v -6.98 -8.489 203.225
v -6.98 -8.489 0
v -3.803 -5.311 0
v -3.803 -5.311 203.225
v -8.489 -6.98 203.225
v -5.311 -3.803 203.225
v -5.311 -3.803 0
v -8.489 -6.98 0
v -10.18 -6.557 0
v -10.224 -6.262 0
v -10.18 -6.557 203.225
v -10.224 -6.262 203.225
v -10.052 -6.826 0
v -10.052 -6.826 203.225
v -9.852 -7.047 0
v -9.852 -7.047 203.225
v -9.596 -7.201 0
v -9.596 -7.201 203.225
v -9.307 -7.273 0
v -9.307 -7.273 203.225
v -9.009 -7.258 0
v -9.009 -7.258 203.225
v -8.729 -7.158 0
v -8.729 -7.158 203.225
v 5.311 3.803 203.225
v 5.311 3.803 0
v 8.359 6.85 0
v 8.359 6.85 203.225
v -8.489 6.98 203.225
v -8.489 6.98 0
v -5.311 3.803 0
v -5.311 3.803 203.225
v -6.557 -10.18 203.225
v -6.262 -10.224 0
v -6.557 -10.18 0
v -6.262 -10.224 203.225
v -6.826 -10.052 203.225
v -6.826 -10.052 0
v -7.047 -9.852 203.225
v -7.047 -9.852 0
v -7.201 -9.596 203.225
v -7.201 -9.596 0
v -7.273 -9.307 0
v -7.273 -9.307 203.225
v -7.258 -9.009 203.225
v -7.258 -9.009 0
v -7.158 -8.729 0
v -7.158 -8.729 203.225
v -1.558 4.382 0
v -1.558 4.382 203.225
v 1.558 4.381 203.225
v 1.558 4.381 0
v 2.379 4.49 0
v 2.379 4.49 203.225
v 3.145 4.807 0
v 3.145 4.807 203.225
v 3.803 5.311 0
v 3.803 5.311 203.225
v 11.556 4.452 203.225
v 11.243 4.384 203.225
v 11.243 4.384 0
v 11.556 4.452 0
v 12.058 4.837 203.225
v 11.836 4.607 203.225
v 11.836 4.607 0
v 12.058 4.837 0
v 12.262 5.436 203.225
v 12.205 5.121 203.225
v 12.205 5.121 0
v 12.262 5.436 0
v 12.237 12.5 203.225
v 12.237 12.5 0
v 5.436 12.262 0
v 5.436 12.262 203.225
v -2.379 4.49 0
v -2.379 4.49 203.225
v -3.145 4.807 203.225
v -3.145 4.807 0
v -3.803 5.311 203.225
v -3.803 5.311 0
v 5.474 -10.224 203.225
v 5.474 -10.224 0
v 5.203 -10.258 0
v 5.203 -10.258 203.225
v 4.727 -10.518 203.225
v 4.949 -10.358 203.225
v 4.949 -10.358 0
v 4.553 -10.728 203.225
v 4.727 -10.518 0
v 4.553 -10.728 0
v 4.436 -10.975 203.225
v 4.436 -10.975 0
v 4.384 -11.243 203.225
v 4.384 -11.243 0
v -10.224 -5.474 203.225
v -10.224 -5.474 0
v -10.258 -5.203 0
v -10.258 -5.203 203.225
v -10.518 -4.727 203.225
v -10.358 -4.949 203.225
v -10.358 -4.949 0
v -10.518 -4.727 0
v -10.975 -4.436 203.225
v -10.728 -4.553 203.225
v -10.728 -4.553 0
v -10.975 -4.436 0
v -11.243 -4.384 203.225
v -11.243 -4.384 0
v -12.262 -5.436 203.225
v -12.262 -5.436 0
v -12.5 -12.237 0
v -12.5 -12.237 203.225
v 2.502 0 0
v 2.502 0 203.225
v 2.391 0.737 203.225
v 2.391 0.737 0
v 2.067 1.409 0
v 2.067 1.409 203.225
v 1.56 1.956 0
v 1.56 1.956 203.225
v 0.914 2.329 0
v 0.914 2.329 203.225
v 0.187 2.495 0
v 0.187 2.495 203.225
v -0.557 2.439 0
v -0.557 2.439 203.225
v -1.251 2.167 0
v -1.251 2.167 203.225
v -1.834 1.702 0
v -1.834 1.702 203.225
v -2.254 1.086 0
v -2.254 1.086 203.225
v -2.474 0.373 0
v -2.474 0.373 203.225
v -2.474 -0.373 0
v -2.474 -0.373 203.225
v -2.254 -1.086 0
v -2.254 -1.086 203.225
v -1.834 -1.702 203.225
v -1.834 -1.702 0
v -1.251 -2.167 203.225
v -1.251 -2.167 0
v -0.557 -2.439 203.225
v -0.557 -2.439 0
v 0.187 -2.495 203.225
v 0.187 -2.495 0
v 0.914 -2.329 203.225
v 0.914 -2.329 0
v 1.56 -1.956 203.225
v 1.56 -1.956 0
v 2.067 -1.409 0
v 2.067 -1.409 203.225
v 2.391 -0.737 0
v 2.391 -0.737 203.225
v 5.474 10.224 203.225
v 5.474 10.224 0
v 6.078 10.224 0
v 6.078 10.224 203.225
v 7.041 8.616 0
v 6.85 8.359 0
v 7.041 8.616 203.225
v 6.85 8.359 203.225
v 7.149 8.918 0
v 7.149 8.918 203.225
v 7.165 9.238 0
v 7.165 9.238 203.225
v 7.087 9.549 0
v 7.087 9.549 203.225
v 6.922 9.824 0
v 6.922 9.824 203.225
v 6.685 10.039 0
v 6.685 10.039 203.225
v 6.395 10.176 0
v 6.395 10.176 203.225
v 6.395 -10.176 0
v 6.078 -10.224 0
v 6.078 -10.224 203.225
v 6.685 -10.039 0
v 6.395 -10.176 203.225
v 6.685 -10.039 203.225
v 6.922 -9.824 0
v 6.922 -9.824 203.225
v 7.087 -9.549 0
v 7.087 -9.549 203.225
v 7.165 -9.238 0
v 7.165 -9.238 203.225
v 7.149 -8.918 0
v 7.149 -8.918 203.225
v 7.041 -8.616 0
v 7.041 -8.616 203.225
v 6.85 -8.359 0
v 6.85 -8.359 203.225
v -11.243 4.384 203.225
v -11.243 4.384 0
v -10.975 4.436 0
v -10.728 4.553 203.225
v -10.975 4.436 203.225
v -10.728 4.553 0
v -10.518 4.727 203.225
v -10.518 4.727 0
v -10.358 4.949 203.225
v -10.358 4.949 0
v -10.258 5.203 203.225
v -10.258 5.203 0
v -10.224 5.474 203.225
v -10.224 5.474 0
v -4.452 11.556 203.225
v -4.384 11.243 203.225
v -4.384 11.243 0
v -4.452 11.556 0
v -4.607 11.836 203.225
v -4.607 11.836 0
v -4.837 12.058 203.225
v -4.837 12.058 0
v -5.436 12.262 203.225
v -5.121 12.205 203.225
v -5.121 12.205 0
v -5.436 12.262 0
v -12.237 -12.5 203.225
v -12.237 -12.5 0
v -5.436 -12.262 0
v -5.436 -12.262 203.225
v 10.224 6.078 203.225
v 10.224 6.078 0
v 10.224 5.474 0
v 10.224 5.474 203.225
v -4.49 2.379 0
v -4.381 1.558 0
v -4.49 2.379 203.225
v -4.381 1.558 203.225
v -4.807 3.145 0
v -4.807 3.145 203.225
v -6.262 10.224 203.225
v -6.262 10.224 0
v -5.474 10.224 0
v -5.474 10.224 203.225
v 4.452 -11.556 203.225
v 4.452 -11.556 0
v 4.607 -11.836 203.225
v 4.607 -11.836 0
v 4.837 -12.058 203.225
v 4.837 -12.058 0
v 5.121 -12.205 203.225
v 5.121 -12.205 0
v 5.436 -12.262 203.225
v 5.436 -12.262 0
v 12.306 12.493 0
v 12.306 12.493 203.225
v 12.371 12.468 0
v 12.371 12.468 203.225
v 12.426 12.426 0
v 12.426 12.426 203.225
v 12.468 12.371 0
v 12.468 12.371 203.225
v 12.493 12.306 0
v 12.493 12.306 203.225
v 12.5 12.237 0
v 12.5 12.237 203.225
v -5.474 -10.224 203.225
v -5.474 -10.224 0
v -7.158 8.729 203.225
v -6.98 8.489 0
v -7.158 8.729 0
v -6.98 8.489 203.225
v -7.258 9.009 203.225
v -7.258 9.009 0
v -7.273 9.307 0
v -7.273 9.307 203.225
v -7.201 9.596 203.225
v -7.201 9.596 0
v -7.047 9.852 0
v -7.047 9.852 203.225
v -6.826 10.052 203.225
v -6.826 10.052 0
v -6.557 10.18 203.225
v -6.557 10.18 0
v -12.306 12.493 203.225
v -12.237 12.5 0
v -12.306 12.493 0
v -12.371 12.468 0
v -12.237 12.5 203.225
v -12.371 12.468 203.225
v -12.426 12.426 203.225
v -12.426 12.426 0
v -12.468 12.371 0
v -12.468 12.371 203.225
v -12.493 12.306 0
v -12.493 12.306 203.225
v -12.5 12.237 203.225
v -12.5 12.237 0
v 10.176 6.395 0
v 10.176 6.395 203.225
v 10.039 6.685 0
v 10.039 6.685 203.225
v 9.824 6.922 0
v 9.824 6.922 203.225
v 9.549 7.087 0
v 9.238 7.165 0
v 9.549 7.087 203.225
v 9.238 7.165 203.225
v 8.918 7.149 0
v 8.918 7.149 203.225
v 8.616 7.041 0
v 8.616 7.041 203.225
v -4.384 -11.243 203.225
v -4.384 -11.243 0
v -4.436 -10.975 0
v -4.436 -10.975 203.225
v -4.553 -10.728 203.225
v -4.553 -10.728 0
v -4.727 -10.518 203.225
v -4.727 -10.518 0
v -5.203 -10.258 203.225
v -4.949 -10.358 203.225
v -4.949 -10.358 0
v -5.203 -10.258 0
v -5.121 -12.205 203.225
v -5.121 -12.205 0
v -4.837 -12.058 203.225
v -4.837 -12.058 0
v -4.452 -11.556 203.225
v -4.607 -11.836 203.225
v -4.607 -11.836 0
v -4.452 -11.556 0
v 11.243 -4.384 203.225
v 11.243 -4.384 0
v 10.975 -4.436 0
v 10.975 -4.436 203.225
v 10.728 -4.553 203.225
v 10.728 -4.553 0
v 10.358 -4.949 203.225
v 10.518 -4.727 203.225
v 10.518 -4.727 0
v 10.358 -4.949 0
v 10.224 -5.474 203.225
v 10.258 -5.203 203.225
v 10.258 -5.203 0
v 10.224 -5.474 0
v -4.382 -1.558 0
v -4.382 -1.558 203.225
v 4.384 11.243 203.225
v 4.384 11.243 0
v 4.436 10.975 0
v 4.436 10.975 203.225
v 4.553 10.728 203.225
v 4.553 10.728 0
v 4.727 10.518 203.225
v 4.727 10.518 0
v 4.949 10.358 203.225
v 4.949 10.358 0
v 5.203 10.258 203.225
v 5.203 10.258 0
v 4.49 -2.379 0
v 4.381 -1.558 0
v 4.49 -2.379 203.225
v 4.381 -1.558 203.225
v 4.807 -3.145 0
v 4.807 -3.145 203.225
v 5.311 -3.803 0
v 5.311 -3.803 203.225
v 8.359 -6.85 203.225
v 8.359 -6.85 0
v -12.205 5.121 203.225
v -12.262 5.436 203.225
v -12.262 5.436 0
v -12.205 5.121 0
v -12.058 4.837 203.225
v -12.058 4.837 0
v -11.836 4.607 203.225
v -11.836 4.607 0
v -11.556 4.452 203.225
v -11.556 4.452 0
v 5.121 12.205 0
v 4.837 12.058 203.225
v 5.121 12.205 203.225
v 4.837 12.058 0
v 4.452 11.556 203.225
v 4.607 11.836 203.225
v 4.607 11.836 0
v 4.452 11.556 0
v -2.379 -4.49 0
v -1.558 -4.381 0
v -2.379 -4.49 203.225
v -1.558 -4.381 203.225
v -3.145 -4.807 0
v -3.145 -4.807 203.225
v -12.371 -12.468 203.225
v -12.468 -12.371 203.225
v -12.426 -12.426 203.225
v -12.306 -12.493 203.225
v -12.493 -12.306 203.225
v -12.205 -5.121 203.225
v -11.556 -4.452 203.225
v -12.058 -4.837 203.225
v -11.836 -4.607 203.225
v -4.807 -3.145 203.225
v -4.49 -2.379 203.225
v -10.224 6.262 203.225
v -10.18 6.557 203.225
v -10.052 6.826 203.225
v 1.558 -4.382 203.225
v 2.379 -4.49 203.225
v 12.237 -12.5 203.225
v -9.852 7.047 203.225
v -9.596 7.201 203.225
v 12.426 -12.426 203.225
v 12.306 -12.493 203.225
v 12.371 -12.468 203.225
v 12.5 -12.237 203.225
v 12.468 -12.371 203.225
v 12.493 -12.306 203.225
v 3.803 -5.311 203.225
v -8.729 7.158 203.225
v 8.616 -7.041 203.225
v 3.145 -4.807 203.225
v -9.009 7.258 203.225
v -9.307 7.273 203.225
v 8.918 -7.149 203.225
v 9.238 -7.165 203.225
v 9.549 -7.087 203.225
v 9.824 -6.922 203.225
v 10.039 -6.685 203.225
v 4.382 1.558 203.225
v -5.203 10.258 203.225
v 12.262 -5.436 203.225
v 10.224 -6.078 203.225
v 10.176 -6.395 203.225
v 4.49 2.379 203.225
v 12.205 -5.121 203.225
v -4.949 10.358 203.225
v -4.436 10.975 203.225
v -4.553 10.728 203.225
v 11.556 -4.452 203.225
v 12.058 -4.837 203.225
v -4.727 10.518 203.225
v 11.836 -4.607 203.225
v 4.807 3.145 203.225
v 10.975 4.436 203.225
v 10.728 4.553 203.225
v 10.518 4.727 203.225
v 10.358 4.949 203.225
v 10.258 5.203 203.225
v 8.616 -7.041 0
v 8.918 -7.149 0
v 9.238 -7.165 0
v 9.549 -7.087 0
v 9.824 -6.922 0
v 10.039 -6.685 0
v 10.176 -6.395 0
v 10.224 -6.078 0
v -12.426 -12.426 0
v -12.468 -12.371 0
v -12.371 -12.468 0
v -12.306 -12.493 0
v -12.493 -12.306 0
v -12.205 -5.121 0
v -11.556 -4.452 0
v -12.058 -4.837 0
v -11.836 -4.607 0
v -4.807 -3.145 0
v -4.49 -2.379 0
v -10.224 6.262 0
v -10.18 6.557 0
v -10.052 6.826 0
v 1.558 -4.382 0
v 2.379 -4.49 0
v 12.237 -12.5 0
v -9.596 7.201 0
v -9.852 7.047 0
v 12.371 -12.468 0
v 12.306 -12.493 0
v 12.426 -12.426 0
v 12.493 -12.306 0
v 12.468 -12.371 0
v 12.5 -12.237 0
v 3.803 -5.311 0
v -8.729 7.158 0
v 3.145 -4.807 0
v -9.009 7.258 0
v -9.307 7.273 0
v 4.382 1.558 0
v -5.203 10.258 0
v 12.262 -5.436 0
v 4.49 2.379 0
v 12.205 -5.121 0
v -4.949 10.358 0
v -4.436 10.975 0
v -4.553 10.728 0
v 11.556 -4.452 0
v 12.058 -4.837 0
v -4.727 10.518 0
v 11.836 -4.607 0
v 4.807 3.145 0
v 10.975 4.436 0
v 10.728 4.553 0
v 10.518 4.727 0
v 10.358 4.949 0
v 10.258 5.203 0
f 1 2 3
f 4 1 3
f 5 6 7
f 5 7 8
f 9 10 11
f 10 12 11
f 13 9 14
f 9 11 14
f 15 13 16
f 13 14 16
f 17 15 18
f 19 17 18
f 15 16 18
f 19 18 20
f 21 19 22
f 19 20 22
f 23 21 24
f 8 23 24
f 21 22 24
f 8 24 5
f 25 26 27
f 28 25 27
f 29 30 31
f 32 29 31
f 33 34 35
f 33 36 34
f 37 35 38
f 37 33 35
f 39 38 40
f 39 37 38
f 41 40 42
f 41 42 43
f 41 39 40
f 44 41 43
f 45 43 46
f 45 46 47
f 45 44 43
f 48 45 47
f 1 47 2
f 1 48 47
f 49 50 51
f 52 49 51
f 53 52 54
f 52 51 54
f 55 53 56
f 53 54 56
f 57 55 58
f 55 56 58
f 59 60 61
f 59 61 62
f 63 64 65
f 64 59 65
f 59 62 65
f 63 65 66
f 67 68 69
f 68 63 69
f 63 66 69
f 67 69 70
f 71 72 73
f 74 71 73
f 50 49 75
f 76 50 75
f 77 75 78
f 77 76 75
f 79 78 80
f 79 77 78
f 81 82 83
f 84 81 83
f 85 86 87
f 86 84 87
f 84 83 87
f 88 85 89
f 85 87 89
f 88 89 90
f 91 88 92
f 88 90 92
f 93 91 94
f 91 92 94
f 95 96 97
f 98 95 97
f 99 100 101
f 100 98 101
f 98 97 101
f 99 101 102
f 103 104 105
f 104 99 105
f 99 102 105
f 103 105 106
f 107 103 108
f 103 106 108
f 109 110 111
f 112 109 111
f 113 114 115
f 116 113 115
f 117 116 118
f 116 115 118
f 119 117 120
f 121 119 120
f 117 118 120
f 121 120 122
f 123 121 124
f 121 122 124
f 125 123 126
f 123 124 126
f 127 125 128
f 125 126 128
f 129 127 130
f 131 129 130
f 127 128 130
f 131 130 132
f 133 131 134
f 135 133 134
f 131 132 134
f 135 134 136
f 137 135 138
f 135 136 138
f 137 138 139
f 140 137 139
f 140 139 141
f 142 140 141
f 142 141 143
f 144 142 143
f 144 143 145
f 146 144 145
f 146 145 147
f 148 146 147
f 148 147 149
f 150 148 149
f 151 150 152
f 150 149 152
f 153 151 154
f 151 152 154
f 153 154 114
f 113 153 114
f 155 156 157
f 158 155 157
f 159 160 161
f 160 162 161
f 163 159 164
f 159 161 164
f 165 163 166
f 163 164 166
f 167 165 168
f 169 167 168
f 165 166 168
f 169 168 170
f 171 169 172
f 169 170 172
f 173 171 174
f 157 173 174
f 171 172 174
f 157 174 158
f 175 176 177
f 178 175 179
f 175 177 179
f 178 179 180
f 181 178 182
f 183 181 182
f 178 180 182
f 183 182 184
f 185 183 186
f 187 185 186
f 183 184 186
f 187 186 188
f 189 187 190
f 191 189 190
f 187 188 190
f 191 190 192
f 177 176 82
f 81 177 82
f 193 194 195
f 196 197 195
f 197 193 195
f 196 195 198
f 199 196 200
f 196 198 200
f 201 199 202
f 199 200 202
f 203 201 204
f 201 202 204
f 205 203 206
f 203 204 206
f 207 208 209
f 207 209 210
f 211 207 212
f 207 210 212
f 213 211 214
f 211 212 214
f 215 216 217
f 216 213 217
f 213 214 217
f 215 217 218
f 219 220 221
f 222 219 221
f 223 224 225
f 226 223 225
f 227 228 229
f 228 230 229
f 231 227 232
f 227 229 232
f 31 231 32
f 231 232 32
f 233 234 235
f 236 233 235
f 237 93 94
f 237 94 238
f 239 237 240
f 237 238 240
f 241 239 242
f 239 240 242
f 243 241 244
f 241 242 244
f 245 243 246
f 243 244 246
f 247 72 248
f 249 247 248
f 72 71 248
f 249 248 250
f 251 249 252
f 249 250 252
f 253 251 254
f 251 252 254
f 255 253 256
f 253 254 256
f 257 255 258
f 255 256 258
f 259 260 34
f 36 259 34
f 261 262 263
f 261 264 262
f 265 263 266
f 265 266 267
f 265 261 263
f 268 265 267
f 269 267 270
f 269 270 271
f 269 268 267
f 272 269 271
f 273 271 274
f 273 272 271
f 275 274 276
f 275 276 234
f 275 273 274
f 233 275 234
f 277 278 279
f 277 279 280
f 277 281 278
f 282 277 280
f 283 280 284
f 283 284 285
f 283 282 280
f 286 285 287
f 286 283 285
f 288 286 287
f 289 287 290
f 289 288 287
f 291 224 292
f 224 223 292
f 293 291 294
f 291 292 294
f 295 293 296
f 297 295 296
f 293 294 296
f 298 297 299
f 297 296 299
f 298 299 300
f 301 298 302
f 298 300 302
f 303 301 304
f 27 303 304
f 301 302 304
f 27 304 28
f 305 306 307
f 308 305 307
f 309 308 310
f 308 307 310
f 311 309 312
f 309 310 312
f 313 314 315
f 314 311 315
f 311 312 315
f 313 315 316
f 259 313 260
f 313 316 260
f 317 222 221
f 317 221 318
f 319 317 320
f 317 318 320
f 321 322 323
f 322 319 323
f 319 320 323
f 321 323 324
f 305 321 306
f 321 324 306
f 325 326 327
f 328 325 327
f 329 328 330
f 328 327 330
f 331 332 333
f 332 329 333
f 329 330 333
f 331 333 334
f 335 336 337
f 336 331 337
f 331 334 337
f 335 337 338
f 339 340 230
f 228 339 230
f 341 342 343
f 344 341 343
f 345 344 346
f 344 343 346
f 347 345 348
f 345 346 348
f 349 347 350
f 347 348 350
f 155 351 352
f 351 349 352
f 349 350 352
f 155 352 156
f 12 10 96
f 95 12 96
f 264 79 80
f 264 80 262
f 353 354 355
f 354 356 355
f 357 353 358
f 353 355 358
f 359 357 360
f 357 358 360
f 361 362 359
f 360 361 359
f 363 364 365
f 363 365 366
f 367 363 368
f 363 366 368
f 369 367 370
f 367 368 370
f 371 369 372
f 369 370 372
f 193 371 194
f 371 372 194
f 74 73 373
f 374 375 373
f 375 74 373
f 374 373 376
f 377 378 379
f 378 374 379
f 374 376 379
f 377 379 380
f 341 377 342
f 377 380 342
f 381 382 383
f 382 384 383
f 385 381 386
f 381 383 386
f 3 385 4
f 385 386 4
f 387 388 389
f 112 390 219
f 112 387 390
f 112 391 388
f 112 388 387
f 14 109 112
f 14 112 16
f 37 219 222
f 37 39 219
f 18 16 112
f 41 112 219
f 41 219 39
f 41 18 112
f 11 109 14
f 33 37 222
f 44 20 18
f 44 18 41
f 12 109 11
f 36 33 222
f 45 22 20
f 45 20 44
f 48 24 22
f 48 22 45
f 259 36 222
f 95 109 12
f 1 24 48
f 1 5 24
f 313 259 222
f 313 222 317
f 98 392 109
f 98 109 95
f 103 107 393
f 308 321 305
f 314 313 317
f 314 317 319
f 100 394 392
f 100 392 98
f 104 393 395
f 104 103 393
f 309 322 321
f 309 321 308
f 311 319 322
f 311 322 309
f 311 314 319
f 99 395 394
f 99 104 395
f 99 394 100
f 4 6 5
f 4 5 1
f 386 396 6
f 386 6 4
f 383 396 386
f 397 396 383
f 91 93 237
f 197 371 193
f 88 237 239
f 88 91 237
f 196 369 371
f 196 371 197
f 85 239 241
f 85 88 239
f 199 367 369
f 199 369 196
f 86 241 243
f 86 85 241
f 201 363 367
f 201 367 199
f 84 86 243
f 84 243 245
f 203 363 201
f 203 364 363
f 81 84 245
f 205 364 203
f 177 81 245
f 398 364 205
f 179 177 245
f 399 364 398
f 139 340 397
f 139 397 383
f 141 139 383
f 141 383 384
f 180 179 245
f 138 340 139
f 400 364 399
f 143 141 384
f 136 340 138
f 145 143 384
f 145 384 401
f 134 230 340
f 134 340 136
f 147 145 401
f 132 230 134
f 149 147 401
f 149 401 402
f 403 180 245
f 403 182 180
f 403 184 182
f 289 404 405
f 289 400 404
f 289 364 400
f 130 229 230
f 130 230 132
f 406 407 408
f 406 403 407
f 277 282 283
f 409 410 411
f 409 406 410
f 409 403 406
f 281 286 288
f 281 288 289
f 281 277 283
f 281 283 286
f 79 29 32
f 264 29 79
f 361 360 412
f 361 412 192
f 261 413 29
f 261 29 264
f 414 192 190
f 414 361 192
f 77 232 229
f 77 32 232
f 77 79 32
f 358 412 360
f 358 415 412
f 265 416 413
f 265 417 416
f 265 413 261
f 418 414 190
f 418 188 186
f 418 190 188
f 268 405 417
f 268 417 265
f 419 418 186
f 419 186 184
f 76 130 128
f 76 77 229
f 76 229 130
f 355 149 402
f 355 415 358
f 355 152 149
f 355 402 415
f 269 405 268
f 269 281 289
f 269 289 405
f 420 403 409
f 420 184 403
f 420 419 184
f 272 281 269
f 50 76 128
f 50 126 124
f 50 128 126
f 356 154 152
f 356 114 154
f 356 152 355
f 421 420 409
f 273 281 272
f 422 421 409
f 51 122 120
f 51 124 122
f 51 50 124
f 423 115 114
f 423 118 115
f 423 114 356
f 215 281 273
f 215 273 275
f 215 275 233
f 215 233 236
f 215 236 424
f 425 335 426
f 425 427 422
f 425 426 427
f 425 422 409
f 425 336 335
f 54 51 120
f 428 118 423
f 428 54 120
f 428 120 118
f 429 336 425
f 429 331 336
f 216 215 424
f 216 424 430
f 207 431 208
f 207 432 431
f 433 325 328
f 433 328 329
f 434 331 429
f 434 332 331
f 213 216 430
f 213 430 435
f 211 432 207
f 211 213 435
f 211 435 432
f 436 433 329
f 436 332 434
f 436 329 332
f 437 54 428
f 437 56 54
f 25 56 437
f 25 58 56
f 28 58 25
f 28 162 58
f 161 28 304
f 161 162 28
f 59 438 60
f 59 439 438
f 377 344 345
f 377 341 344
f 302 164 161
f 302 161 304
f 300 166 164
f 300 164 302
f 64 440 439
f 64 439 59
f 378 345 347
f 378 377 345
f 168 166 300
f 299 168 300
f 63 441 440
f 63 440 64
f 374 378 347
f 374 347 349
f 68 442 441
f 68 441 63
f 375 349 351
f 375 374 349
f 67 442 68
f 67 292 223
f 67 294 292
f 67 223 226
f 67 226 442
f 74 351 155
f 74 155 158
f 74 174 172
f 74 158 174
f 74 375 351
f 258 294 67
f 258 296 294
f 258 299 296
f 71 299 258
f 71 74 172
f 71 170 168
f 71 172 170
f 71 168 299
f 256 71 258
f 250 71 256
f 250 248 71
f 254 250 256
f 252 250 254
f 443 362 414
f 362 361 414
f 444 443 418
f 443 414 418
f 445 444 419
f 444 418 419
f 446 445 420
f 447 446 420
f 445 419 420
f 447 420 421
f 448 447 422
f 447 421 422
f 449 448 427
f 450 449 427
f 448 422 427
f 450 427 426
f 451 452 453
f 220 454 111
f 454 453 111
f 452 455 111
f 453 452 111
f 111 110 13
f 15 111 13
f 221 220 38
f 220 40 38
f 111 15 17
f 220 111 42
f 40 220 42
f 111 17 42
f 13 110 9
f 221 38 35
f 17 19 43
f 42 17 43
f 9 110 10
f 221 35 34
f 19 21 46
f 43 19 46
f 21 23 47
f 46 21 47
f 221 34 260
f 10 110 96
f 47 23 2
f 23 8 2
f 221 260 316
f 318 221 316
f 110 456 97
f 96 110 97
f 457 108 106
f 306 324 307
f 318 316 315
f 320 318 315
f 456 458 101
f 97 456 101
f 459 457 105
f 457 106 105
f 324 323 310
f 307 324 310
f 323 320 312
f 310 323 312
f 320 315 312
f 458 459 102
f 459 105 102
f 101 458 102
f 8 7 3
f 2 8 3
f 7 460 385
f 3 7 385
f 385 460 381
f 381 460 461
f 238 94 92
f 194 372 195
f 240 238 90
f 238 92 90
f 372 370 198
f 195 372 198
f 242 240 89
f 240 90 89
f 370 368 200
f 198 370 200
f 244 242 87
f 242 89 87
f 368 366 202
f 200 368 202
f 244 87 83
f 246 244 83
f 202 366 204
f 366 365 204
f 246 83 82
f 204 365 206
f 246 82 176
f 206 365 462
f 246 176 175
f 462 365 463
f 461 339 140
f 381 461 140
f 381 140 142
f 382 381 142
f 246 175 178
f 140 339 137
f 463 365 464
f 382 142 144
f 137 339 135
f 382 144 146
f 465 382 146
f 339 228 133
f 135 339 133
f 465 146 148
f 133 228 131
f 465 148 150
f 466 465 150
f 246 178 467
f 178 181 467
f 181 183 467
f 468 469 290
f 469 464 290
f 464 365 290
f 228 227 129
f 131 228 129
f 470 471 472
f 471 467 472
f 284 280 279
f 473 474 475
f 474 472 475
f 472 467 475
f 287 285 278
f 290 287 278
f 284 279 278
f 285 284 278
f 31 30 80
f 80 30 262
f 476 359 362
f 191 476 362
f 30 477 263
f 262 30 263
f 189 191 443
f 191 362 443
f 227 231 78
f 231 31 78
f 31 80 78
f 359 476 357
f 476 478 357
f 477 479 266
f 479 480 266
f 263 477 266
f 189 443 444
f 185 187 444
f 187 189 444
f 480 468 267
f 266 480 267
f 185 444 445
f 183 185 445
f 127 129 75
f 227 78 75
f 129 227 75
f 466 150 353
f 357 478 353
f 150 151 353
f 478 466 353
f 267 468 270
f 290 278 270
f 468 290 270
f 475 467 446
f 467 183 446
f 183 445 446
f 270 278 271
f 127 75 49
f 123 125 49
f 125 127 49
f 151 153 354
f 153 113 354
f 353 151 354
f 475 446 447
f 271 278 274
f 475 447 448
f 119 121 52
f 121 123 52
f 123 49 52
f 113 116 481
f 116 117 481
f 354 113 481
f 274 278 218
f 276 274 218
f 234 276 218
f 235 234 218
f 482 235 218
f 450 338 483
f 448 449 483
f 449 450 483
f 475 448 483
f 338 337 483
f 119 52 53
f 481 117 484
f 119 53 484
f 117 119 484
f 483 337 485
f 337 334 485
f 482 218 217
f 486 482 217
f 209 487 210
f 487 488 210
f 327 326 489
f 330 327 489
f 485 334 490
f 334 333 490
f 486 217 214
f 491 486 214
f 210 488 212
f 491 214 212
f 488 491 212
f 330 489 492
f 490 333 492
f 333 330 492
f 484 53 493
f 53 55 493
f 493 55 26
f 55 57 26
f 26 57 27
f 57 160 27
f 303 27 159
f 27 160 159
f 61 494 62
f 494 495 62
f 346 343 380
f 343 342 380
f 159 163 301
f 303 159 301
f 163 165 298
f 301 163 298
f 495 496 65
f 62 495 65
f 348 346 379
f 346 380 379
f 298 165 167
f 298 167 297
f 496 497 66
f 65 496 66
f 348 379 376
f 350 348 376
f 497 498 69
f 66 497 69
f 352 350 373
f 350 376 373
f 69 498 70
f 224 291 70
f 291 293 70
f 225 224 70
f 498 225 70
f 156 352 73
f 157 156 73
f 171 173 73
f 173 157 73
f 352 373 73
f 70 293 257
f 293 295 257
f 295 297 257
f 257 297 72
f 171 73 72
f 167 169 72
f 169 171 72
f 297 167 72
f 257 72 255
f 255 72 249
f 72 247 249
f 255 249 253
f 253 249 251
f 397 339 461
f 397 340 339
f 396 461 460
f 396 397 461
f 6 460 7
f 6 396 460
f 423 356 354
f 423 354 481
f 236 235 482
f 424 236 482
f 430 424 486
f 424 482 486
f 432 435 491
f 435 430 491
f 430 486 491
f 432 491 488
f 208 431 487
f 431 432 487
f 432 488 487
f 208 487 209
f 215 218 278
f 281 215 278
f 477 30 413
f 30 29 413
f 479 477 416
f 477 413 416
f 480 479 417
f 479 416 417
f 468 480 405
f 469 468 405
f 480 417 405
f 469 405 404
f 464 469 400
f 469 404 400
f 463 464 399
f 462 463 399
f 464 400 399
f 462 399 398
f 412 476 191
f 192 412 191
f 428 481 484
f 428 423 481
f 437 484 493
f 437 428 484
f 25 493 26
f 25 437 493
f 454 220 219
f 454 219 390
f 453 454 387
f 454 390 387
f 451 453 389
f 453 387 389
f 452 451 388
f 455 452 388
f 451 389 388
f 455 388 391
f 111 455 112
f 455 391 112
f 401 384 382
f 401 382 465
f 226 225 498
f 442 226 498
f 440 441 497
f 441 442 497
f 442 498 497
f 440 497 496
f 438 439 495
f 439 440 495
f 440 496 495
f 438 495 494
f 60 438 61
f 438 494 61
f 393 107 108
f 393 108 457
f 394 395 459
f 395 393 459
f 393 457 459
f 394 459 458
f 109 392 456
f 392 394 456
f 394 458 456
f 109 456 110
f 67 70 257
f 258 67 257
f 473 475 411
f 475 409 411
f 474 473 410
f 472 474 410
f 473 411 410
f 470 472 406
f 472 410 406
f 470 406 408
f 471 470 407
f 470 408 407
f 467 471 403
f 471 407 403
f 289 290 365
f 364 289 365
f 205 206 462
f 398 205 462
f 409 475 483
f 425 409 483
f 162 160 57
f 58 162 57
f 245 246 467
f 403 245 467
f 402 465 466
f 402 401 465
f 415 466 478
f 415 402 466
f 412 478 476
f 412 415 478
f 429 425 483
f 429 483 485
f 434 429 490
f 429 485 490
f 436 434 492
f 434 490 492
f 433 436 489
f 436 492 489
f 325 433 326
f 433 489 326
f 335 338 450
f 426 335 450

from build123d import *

# Parameters (mm, degrees)
BOSS_EXTRUDE1_DEPTH   = 203.2254
BOSS_EXTRUDE1_2_DEPTH = 203.2254
BOSS_EXTRUDE1_3_DEPTH = 203.2254
BOSS_EXTRUDE1_4_DEPTH = 203.2254
FILLET1_R             = 1.0922
FILLET2_R             = 1.0922
FILLET3_R             = 1.016
FILLET4_R             = 1.016
FILLET5_R             = 0.254
FILLET6_R             = 0.254
FILLET7_R             = 0.254
FILLET8_R             = 0.254
FILLET9_R             = 1.016
FILLET10_R            = 1.0922
FILLET11_R            = 1.0922
FILLET12_R            = 1.0922
FILLET13_R            = 1.0922
FILLET14_R            = 1.0922
SKETCH2_W             = 8.763
SKETCH2_H             = 8.763
SKETCH2_R             = 2.5019
BOSS_EXTRUDE2_DEPTH   = 203.2254
FILLET15_R            = 3.175


with BuildPart() as part:
    # Sketch1 → Boss-Extrude1 (new body)
    with BuildSketch(Plane.XY):
        Polygon((-8.714816972, 10.2235), (-4.3815, 10.2235), (-4.3815, 12.225663986), (-12.5095, 12.5095), (-12.225663986, 4.3815), (-10.2235, 4.3815), (-10.2235, 8.714816972), (-4.3815, 2.872816972), (-4.3815, 4.3815), (-2.872816972, 4.3815), align=None)
    extrude(amount=BOSS_EXTRUDE1_DEPTH)

    # Fillet1
    # the kernel refuses this fillet: 1.0922 mm, written as the material it takes off along each edge
    with BuildSketch(Plane(origin=(-4.3815, 10.2235, -2.7305), x_dir=(-1, 0, 0), z_dir=(0, 0, 1))) as fillet1_piece_1:
        with BuildLine():
            CenterArc((FILLET1_R, -FILLET1_R), FILLET1_R, 90, 90)
            Line((0, -FILLET1_R), (0, 0))
            Line((0, 0), (FILLET1_R, 0))
        make_face()
    extrude(amount=208.6864, mode=Mode.SUBTRACT)
    with BuildSketch(Plane(origin=(-4.3815, 12.225663986, -2.6368132), x_dir=(0, -1, 0), z_dir=(0, 0, 1))) as fillet1_piece_2:
        with BuildLine():
            CenterArc((FILLET1_R * 0.965688774807, -FILLET1_R), FILLET1_R, 90, 88)
            Line((-FILLET1_R * 0.033702052212, -FILLET1_R * 0.965100503298), (0, 0))
            Line((0, 0), (FILLET1_R * 0.965688774807, 0))
        make_face()
    extrude(amount=208.499026399, mode=Mode.SUBTRACT)

    # Fillet2
    # the kernel refuses this fillet: 1.0922 mm, written as the material it takes off along each edge
    with BuildSketch(Plane(origin=(-10.2235, 4.3815, -2.7305), x_dir=(0, 1, 0), z_dir=(0, 0, 1))) as fillet2_piece_1:
        with BuildLine():
            CenterArc((FILLET2_R, FILLET2_R), FILLET2_R, 180, 90)
            Line((0, FILLET2_R), (0, 0))
            Line((0, 0), (FILLET2_R, 0))
        make_face()
    extrude(amount=208.6864, mode=Mode.SUBTRACT)
    with BuildSketch(Plane(origin=(-12.225663986, 4.3815, -2.6368132), x_dir=(1, 0, 0), z_dir=(0, 0, 1))) as fillet2_piece_2:
        with BuildLine():
            CenterArc((FILLET2_R * 0.965688774807, FILLET2_R), FILLET2_R, 182, 88)
            Line((-FILLET2_R * 0.033702052212, FILLET2_R * 0.965100503298), (0, 0))
            Line((0, 0), (FILLET2_R * 0.965688774807, 0))
        make_face()
    extrude(amount=208.499026399, mode=Mode.SUBTRACT)

    # Fillet3
    fillet3_edges = [part.edges().sort_by_distance(p)[0] for p in [
        (-10.2235, 8.714816972, 101.6127),
    ]]
    fillet(fillet3_edges, radius=FILLET3_R)

    # Fillet4
    fillet4_edges = [part.edges().sort_by_distance(p)[0] for p in [
        (-8.714816972, 10.2235, 101.6127),
    ]]
    fillet(fillet4_edges, radius=FILLET4_R)

    # Fillet5
    fillet5_edges = [part.edges().sort_by_distance(p)[0] for p in [
        (-12.5095, 12.5095, 101.6127),
    ]]
    fillet(fillet5_edges, radius=FILLET5_R)



with BuildPart() as body_2:
    # Sketch1 → Boss-Extrude1 2 (new body)
    with BuildSketch(Plane.XY):
        Polygon((12.5095, 12.5095), (4.3815, 12.225663986), (4.3815, 10.2235), (8.714816972, 10.2235), (2.872816972, 4.3815), (4.3815, 4.3815), (4.3815, 2.872816972), (10.2235, 8.714816972), (10.2235, 4.3815), (12.225663986, 4.3815), align=None)
    extrude(amount=BOSS_EXTRUDE1_2_DEPTH)

    # Fillet7
    fillet7_edges = [body_2.edges().sort_by_distance(p)[0] for p in [
        (12.5095, 12.5095, 101.6127),
    ]]
    fillet(fillet7_edges, radius=FILLET7_R)

    # Fillet11
    # the kernel refuses this fillet: 1.0922 mm, written as the material it takes off along each edge
    with BuildSketch(Plane(origin=(4.3815, 10.2235, -2.7305), x_dir=(0, 1, 0), z_dir=(0, 0, 1))) as fillet11_piece_1:
        with BuildLine():
            CenterArc((FILLET11_R, -FILLET11_R), FILLET11_R, 90, 90)
            Line((0, -FILLET11_R), (0, 0))
            Line((0, 0), (FILLET11_R, 0))
        make_face()
    extrude(amount=208.6864, mode=Mode.SUBTRACT)
    with BuildSketch(Plane(origin=(4.3815, 12.225663986, -2.6368132), x_dir=(0.9993908270190961, 0.03489949670249208, 0), z_dir=(0, 0, 1))) as fillet11_piece_2:
        with BuildLine():
            CenterArc((FILLET11_R * 0.965688774807, -FILLET11_R), FILLET11_R, 90, 88)
            Line((-FILLET11_R * 0.033702052212, -FILLET11_R * 0.965100503298), (0, 0))
            Line((0, 0), (FILLET11_R * 0.965688774807, 0))
        make_face()
    extrude(amount=208.499026399, mode=Mode.SUBTRACT)
    with BuildSketch(Plane(origin=(10.2235, 4.3815, -2.7305), x_dir=(1, 0, 0), z_dir=(0, 0, 1))) as fillet11_piece_3:
        with BuildLine():
            CenterArc((FILLET11_R, FILLET11_R), FILLET11_R, 180, 90)
            Line((0, FILLET11_R), (0, 0))
            Line((0, 0), (FILLET11_R, 0))
        make_face()
    extrude(amount=208.6864, mode=Mode.SUBTRACT)
    with BuildSketch(Plane(origin=(12.225663986, 4.3815, -2.6368132), x_dir=(0.03489949670249721, 0.9993908270190958, 0), z_dir=(0, 0, 1))) as fillet11_piece_4:
        with BuildLine():
            CenterArc((FILLET11_R * 0.965688774807, FILLET11_R), FILLET11_R, 182, 88)
            Line((-FILLET11_R * 0.033702052212, FILLET11_R * 0.965100503298), (0, 0))
            Line((0, 0), (FILLET11_R * 0.965688774807, 0))
        make_face()
    extrude(amount=208.499026399, mode=Mode.SUBTRACT)

    # Fillet14
    fillet14_edges = [body_2.edges().sort_by_distance(p)[0] for p in [
        (10.2235, 8.714816972, 101.6127),
        (8.714816972, 10.2235, 101.6127),
    ]]
    fillet(fillet14_edges, radius=FILLET14_R)


with BuildPart() as body_3:
    # Sketch1 → Boss-Extrude1 3 (new body)
    with BuildSketch(Plane.XY):
        Polygon((12.5095, -12.5095), (12.225663986, -4.3815), (10.2235, -4.3815), (10.2235, -8.714816972), (4.3815, -2.872816972), (4.3815, -4.3815), (2.872816972, -4.3815), (8.714816972, -10.2235), (4.3815, -10.2235), (4.3815, -12.225663986), align=None)
    extrude(amount=BOSS_EXTRUDE1_3_DEPTH)

    # Fillet8
    fillet8_edges = [body_3.edges().sort_by_distance(p)[0] for p in [
        (12.5095, -12.5095, 101.6127),
    ]]
    fillet(fillet8_edges, radius=FILLET8_R)

    # Fillet12
    # the kernel refuses this fillet: 1.0922 mm, written as the material it takes off along each edge
    with BuildSketch(Plane(origin=(12.225663986, -4.3815, -2.6368132), x_dir=(0.03489949670249375, -0.999390827019096, 0), z_dir=(0, 0, 1))) as fillet12_piece_1:
        with BuildLine():
            CenterArc((FILLET12_R * 0.965688774807, -FILLET12_R), FILLET12_R, 90, 88)
            Line((-FILLET12_R * 0.033702052212, -FILLET12_R * 0.965100503298), (0, 0))
            Line((0, 0), (FILLET12_R * 0.965688774807, 0))
        make_face()
    extrude(amount=208.499026399, mode=Mode.SUBTRACT)
    with BuildSketch(Plane(origin=(10.2235, -4.3815, -2.7305), x_dir=(1, 0, 0), z_dir=(0, 0, 1))) as fillet12_piece_2:
        with BuildLine():
            CenterArc((FILLET12_R, -FILLET12_R), FILLET12_R, 90, 90)
            Line((0, -FILLET12_R), (0, 0))
            Line((0, 0), (FILLET12_R, 0))
        make_face()
    extrude(amount=208.6864, mode=Mode.SUBTRACT)
    with BuildSketch(Plane(origin=(4.3815, -12.225663986, -2.6368132), x_dir=(0.9993908270190958, -0.03489949670249721, 0), z_dir=(0, 0, 1))) as fillet12_piece_3:
        with BuildLine():
            CenterArc((FILLET12_R * 0.965688774807, FILLET12_R), FILLET12_R, 182, 88)
            Line((-FILLET12_R * 0.033702052212, FILLET12_R * 0.965100503298), (0, 0))
            Line((0, 0), (FILLET12_R * 0.965688774807, 0))
        make_face()
    extrude(amount=208.499026399, mode=Mode.SUBTRACT)
    with BuildSketch(Plane(origin=(4.3815, -10.2235, -2.7305), x_dir=(0, -1, 0), z_dir=(0, 0, 1))) as fillet12_piece_4:
        with BuildLine():
            CenterArc((FILLET12_R, FILLET12_R), FILLET12_R, 180, 90)
            Line((0, FILLET12_R), (0, 0))
            Line((0, 0), (FILLET12_R, 0))
        make_face()
    extrude(amount=208.6864, mode=Mode.SUBTRACT)

    # Fillet13
    fillet13_edges = [body_3.edges().sort_by_distance(p)[0] for p in [
        (8.714816972, -10.2235, 101.6127),
        (10.2235, -8.714816972, 101.6127),
    ]]
    fillet(fillet13_edges, radius=FILLET13_R)


with BuildPart() as body_4:
    # Sketch1 → Boss-Extrude1 4 (new body)
    with BuildSketch(Plane.XY):
        Polygon((-12.5095, -12.5095), (-4.3815, -12.225663986), (-4.3815, -10.2235), (-8.714816972, -10.2235), (-2.872816972, -4.3815), (-4.3815, -4.3815), (-4.3815, -2.872816972), (-10.2235, -8.714816972), (-10.2235, -4.3815), (-12.225663986, -4.3815), align=None)
    extrude(amount=BOSS_EXTRUDE1_4_DEPTH)

    # Fillet6
    fillet6_edges = [body_4.edges().sort_by_distance(p)[0] for p in [
        (-12.5095, -12.5095, 101.6127),
    ]]
    fillet(fillet6_edges, radius=FILLET6_R)

    # Fillet9
    fillet9_edges = [body_4.edges().sort_by_distance(p)[0] for p in [
        (-10.2235, -8.714816972, 101.6127),
        (-8.714816972, -10.2235, 101.6127),
    ]]
    fillet(fillet9_edges, radius=FILLET9_R)

    # Fillet10
    # the kernel refuses this fillet: 1.0922 mm, written as the material it takes off along each edge
    with BuildSketch(Plane(origin=(-4.3815, -10.2235, -2.7305), x_dir=(-1, 0, 0), z_dir=(0, 0, 1)), Plane(origin=(-10.2235, -4.3815, -2.7305), x_dir=(-1, 0, 0), z_dir=(0, 0, 1))) as fillet10_piece_1:
        with BuildLine():
            CenterArc((FILLET10_R, FILLET10_R), FILLET10_R, 180, 90)
            Line((0, FILLET10_R), (0, 0))
            Line((0, 0), (FILLET10_R, 0))
        make_face()
    extrude(amount=208.6864, mode=Mode.SUBTRACT)
    with BuildSketch(Plane(origin=(-4.3815, -12.225663986, -2.6368132), x_dir=(0, 1, 0), z_dir=(0, 0, 1)), Plane(origin=(-12.225663986, -4.3815, -2.6368132), x_dir=(-0.03489949670249721, -0.9993908270190958, 0), z_dir=(0, 0, 1))) as fillet10_piece_2:
        with BuildLine():
            CenterArc((FILLET10_R * 0.965688774807, FILLET10_R), FILLET10_R, 182, 88)
            Line((-FILLET10_R * 0.033702052212, FILLET10_R * 0.965100503298), (0, 0))
            Line((0, 0), (FILLET10_R * 0.965688774807, 0))
        make_face()
    extrude(amount=208.499026399, mode=Mode.SUBTRACT)


with BuildPart() as part_1:
    add(part.part)

    add(body_2.part)  # Boss-Extrude2 merges body 2

    add(body_3.part)  # Boss-Extrude2 merges body 3

    add(body_4.part)  # Boss-Extrude2 merges body 4
    # Sketch2 → Boss-Extrude2 (add)
    with BuildSketch(Plane.XY.offset(203.2254)):
        Rectangle(SKETCH2_W, SKETCH2_H)
        Circle(SKETCH2_R, mode=Mode.SUBTRACT)
    extrude(amount=-BOSS_EXTRUDE2_DEPTH)

    # Fillet15
    fillet15_edges = [part_1.edges().sort_by_distance(p)[0] for p in [
        (4.3815, -2.872816972, 101.6127),
        (2.872816972, -4.3815, 101.6127),
        (-2.872816972, -4.3815, 101.6127),
        (-4.3815, -2.872816972, 101.6127),
        (-2.872816972, 4.3815, 101.6127),
        (-4.3815, 2.872816972, 101.6127),
        (2.872816972, 4.3815, 101.6127),
        (4.3815, 2.872816972, 101.6127),
    ]]
    fillet(fillet15_edges, radius=FILLET15_R)


solid = part_1.part
